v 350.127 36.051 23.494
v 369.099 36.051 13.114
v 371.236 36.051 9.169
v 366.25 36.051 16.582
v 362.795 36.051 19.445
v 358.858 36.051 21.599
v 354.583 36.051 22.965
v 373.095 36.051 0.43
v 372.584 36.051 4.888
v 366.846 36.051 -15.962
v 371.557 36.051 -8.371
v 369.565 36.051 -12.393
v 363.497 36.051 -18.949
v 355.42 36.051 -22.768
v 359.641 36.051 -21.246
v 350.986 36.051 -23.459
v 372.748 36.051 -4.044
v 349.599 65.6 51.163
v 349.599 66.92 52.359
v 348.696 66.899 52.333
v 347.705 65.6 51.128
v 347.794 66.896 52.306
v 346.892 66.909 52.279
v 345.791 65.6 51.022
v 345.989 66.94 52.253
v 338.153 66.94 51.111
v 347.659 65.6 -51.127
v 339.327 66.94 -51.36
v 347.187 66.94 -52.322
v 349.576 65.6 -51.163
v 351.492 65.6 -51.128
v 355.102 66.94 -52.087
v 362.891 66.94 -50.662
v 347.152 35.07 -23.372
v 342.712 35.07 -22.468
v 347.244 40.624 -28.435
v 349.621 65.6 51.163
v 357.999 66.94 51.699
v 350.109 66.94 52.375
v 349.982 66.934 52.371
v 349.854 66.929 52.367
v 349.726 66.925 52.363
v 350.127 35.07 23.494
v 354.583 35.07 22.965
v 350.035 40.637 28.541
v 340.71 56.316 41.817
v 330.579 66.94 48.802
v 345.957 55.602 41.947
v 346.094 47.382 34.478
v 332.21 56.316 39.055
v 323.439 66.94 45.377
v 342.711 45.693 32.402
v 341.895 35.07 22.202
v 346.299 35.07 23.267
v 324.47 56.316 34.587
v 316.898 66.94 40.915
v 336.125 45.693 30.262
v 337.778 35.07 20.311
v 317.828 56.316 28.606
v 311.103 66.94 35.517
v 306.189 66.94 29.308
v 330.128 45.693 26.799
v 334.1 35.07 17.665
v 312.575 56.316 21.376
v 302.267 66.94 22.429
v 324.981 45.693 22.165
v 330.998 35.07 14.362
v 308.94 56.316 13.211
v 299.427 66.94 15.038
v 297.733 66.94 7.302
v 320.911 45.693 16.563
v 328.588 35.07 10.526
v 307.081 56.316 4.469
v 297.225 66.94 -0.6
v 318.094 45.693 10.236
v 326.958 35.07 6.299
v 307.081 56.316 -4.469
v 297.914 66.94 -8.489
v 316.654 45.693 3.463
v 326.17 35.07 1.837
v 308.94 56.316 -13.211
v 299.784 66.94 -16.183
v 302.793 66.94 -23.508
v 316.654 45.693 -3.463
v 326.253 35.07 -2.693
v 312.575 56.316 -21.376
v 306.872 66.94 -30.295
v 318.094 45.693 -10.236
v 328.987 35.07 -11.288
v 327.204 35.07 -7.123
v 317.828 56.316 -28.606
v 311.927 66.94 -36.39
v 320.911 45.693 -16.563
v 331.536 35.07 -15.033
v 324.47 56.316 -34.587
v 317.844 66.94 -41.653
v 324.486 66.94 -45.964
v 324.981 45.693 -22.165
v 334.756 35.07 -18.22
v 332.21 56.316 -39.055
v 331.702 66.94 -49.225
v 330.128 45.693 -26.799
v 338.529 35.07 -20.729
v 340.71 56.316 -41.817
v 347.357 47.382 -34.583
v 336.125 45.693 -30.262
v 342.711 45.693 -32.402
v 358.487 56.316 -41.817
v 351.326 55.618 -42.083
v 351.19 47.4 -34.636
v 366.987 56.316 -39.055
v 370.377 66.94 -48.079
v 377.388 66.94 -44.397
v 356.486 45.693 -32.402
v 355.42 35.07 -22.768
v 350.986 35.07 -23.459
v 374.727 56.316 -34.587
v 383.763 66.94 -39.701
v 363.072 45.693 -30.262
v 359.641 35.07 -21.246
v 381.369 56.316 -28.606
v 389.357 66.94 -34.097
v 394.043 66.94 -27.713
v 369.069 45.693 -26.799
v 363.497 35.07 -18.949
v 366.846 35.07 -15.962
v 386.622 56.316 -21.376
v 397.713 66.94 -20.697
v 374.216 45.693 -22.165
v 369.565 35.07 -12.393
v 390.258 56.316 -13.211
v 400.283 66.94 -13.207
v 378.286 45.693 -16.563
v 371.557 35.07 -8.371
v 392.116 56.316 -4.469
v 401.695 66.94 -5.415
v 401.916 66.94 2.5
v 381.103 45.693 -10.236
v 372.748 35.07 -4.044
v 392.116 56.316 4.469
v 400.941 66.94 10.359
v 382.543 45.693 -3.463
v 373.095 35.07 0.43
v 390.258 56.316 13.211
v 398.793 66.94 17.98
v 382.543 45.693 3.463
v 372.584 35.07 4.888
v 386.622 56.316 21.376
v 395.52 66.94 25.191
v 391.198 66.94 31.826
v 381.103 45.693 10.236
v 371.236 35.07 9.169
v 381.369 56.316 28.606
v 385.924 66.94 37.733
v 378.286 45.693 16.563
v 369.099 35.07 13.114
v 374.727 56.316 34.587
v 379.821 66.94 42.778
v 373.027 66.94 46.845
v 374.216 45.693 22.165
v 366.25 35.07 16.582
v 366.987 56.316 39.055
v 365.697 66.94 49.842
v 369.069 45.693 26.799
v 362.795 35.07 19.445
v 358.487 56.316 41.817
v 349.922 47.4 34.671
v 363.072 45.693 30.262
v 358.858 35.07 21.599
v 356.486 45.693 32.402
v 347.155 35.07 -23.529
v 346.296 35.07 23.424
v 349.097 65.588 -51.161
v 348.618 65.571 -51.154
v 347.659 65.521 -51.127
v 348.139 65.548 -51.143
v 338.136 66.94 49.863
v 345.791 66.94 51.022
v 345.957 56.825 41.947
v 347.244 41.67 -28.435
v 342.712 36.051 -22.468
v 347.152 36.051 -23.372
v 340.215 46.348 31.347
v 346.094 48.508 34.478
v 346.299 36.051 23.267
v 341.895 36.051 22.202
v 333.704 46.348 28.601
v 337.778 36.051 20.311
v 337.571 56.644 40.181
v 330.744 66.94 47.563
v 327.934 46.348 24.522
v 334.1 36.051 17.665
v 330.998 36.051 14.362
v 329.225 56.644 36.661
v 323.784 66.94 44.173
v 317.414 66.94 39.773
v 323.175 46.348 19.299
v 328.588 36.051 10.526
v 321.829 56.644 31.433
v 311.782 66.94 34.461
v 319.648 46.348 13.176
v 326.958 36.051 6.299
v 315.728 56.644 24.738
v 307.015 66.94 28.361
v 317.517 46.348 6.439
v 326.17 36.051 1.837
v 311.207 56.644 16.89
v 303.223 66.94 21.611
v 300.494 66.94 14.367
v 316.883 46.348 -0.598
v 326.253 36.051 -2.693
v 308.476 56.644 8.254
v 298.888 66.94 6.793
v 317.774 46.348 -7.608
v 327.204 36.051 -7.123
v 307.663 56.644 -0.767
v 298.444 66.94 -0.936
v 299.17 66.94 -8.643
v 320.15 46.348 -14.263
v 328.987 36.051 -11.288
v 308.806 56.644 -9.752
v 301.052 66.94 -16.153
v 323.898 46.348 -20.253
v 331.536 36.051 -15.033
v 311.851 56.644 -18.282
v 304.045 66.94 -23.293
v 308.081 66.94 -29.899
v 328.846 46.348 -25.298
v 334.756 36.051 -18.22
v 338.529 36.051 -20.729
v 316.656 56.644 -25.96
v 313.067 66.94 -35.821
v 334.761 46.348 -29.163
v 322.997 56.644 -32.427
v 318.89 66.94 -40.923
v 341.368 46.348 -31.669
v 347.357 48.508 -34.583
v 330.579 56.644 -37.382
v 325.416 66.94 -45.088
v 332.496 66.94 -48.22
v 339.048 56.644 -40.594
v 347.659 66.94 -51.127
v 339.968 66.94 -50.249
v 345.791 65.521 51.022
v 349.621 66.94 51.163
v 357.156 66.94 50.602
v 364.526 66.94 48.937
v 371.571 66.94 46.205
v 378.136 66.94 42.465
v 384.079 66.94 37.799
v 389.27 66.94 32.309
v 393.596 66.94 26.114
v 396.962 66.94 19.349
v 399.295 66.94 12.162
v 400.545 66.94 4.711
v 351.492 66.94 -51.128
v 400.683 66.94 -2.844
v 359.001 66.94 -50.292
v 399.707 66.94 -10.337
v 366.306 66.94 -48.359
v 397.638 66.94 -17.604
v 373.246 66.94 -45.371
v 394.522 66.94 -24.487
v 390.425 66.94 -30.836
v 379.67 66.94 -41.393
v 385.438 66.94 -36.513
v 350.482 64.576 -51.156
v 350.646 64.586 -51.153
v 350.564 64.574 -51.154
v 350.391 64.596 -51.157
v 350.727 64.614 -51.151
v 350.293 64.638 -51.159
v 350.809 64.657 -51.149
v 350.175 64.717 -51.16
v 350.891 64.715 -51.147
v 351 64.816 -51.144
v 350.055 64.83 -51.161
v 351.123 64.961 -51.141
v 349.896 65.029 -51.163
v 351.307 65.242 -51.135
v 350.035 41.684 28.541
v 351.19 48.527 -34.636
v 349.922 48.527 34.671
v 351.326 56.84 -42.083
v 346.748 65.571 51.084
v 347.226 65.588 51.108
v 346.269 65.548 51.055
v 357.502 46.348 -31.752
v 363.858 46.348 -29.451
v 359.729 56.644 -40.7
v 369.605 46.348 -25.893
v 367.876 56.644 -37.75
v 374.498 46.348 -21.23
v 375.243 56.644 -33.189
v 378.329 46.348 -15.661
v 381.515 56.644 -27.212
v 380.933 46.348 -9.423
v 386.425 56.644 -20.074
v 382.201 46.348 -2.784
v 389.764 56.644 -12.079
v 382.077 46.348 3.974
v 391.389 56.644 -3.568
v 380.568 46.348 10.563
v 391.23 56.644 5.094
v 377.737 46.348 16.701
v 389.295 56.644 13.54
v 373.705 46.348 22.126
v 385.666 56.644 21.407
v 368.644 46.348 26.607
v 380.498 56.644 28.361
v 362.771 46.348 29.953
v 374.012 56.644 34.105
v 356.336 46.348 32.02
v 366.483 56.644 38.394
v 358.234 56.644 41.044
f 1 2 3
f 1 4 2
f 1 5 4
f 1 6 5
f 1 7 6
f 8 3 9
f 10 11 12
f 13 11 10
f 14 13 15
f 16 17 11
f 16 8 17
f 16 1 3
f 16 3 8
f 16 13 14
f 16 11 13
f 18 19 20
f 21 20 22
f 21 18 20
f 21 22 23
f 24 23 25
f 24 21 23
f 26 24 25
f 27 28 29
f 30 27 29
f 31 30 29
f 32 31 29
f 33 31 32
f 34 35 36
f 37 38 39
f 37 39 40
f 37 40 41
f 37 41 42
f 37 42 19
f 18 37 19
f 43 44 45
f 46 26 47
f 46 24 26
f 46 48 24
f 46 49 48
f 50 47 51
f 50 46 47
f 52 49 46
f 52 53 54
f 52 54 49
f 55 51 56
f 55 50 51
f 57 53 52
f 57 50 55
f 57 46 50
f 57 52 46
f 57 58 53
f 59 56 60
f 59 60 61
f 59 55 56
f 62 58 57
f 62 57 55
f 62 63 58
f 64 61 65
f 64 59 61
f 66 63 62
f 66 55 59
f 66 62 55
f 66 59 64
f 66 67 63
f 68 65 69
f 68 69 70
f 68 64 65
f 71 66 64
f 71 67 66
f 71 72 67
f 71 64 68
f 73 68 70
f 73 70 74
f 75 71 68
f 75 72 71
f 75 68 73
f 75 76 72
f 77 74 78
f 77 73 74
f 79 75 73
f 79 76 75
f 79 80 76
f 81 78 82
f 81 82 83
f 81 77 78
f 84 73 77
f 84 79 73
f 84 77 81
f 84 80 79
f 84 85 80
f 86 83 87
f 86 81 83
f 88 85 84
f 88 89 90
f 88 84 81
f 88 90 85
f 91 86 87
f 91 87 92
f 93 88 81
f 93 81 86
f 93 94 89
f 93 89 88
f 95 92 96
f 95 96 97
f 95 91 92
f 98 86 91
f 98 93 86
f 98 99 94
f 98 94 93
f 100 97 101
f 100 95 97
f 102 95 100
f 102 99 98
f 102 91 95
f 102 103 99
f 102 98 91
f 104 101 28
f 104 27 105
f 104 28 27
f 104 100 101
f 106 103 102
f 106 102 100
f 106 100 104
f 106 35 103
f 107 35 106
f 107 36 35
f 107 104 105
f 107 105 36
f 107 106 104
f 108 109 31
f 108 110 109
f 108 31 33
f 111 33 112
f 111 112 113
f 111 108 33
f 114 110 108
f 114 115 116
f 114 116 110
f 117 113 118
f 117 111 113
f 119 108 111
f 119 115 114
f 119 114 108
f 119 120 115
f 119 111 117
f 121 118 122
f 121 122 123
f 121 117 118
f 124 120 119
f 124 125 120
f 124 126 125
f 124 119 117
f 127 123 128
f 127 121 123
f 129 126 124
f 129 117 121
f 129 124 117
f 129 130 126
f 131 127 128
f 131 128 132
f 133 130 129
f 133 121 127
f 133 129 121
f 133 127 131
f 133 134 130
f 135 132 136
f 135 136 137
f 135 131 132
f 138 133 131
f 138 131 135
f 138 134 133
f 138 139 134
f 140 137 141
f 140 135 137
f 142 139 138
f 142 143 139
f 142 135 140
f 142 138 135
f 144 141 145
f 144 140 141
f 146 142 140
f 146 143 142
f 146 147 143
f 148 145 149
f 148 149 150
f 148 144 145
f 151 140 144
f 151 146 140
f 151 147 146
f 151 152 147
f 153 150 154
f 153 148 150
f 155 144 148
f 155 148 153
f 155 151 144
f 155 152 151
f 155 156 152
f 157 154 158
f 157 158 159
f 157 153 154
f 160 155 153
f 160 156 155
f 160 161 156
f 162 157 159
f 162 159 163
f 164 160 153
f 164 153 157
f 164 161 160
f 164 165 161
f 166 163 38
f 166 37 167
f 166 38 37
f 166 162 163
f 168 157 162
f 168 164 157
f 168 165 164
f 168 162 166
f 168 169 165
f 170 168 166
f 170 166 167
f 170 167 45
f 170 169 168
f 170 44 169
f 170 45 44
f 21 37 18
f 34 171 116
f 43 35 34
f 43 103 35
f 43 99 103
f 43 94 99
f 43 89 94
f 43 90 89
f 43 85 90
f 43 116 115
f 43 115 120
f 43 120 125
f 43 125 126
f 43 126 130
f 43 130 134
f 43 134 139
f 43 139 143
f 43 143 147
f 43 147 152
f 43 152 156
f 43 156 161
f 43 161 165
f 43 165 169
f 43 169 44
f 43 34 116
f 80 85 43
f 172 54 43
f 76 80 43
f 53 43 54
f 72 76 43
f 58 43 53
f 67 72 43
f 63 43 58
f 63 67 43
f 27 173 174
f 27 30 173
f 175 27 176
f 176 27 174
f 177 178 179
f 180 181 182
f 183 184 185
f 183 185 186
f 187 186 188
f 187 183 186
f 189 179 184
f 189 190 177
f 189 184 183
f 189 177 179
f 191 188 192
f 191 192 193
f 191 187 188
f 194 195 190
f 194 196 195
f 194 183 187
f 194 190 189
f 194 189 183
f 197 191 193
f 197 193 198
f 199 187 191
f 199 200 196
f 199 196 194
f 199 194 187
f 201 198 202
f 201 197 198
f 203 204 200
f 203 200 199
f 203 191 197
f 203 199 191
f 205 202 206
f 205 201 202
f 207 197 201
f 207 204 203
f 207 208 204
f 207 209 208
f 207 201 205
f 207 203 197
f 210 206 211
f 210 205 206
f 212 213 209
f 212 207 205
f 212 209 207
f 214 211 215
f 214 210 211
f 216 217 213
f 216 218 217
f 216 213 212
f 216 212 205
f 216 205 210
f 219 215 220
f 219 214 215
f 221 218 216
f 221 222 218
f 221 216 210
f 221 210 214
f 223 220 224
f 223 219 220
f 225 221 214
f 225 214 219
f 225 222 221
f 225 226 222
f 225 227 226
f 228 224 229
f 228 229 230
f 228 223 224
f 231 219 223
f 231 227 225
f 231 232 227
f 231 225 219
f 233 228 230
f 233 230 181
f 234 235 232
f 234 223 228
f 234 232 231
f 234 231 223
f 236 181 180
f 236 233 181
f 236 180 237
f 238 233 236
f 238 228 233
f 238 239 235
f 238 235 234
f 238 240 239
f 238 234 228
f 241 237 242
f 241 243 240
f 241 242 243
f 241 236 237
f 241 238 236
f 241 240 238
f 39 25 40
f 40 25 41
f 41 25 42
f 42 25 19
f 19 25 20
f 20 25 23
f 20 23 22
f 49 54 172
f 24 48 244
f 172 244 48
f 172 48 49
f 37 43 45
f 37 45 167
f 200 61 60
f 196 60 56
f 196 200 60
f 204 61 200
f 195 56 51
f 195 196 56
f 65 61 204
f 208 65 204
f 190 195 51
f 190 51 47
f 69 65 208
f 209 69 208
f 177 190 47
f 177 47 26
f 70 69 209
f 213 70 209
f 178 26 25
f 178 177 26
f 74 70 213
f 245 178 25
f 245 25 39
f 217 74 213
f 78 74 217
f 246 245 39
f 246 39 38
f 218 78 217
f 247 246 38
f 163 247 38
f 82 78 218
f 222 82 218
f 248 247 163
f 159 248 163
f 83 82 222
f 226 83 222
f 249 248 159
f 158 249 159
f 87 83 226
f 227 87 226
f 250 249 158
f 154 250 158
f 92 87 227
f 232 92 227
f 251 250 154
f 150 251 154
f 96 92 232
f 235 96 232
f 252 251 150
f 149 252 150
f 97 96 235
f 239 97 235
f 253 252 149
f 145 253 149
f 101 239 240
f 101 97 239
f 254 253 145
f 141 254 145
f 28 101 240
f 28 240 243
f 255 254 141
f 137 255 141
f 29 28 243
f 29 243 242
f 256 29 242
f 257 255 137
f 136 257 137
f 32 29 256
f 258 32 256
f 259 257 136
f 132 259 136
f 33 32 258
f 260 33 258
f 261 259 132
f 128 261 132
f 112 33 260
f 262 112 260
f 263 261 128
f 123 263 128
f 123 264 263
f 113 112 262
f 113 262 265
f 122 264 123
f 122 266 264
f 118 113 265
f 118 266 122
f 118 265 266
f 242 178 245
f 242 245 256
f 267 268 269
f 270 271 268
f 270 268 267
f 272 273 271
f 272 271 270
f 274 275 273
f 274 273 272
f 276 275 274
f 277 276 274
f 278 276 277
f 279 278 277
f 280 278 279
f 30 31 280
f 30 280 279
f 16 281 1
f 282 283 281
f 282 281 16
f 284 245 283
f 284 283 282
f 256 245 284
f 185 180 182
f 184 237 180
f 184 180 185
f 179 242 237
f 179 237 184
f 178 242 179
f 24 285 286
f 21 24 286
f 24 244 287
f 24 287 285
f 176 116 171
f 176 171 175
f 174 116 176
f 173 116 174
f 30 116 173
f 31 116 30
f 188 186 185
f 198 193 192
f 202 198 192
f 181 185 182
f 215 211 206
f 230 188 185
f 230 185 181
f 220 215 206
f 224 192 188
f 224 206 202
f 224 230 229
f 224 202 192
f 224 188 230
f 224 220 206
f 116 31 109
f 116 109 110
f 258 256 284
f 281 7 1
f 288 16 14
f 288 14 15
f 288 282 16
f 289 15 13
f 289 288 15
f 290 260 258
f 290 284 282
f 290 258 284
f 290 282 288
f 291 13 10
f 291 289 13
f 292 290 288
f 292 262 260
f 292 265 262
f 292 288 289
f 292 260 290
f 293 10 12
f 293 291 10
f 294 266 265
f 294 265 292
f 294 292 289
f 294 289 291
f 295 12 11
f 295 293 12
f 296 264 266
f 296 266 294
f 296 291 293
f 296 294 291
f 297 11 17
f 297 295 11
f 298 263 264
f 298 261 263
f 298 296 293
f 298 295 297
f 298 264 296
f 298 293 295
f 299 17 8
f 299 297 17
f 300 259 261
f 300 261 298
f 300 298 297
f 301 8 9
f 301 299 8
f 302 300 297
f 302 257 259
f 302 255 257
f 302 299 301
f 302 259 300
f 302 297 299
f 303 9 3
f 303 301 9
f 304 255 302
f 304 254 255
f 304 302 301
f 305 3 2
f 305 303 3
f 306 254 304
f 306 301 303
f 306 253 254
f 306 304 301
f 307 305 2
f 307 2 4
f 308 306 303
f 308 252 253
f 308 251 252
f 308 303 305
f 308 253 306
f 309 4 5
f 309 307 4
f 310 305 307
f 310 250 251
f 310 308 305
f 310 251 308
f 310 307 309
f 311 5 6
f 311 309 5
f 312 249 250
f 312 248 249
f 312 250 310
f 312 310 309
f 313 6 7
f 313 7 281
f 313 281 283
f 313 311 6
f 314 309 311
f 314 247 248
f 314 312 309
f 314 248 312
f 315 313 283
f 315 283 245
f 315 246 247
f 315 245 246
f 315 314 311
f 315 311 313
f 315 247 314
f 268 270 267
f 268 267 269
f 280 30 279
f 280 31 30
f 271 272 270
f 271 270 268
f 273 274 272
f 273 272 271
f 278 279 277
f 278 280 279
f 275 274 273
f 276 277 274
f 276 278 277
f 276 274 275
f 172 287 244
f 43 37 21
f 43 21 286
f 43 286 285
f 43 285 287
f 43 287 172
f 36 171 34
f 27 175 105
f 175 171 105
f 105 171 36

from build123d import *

# Parameters (mm, degrees)
BOSS_EXTRUDE1_DEPTH = 35
CUT_EXTRUDE2_DEPTH  = 10
CUT_EXTRUDE3_DEPTH  = 35
SKETCH7_W           = 1.915857316
SKETCH7_H           = 33.660559038
CUT_EXTRUDE4_DEPTH  = 0.1


with BuildPart() as part:
    # Sketch1 → Revolve1 (revolve)
    with BuildSketch(Plane.XY, mode=Mode.PRIVATE) as revolve1_sk:
        Polygon((373.098534333, 35.069747422), (349.598534333, 35.069747422), (349.598534333, 36.051468212), (373.098534333, 36.051468212), (400.761964989, 66.939755158), (401.975618585, 66.939755158), align=None)
    revolve(revolve1_sk.sketch.rotate(Axis((349.598534333, 66.939755158, 0), (0, -1, 0)), 90), axis=Axis((349.598534333, 66.939755158, 0), (0, -1, 0)))

    # Sketch2 → Boss-Extrude1 (add)
    with BuildSketch(Plane(origin=(0, 66.939755158, 0), x_dir=(1, 0, 0), z_dir=(0, 1, 0))):
        with BuildLine():
            ThreePointArc((351.491870795, 51.128386573), (349.575661264, 51.163425543), (347.659483828, 51.12667327))
            Line((347.659483828, 51.12667327), (345.790974227, -51.02155547))
            ThreePointArc((345.790974227, -51.02155547), (347.704525671, -51.128361676), (349.620734741, -51.16342584))
            Line((349.620734741, -51.16342584), (351.491870795, 51.128386573))
        make_face()
    extrude(amount=-BOSS_EXTRUDE1_DEPTH)

    # Sketch3 → Cut-Extrude2 (cut)
    with BuildSketch(Plane(origin=(350.439365404, 0, 6.410285591), x_dir=(0.018289079495206917, 0, -0.9998327407977887), z_dir=(0.9998327407977886, 0, 0.018289079495206913))):
        Polygon((-44.760626875, 65.600314196), (-17.086632512, 35.069747422), (29.874303283, 35.069747422), (57.548297647, 65.600314196), (57.842029456, 31.939755158), (-44.760626875, 31.939755158), align=None)
    extrude(amount=-CUT_EXTRUDE2_DEPTH, mode=Mode.SUBTRACT)

    # Sketch6 → Cut-Extrude3 (cut)
    with BuildSketch(Plane(origin=(0, 66.939755158, 0), x_dir=(1, 0, 0), z_dir=(0, 1, 0))):
        Polygon((350.109498728, -52.374591838), (349.598534333, -52.377084252), (349.598534333, -53.887685529), (342.379231724, -53.887685529), (345.988883028, -52.252553739), align=None)
    extrude(amount=-CUT_EXTRUDE3_DEPTH, mode=Mode.SUBTRACT)


with BuildPart() as cut_extrude3_kept_piece:
    # of the separate pieces the step leaves, the one the design keeps (cut_extrude3_pieces_kept)
    add(part.part.solids().sort_by_distance((350.985738912, 35.069747422, -23.45902094))[0])

    # Sketch7 → Cut-Extrude4 (cut)
    with BuildSketch(Plane(origin=(-0.818630663, 0, 44.753140248), x_dir=(-0.9998327407977887, 0, -0.01828907949520692), z_dir=(0.018289079495206917, 0, -0.9998327407977886))):
        with Locations((-349.540060761, 48.770034677)):
            Rectangle(SKETCH7_W, SKETCH7_H)
    extrude(amount=-CUT_EXTRUDE4_DEPTH, mode=Mode.SUBTRACT)


solid = cut_extrude3_kept_piece.part
